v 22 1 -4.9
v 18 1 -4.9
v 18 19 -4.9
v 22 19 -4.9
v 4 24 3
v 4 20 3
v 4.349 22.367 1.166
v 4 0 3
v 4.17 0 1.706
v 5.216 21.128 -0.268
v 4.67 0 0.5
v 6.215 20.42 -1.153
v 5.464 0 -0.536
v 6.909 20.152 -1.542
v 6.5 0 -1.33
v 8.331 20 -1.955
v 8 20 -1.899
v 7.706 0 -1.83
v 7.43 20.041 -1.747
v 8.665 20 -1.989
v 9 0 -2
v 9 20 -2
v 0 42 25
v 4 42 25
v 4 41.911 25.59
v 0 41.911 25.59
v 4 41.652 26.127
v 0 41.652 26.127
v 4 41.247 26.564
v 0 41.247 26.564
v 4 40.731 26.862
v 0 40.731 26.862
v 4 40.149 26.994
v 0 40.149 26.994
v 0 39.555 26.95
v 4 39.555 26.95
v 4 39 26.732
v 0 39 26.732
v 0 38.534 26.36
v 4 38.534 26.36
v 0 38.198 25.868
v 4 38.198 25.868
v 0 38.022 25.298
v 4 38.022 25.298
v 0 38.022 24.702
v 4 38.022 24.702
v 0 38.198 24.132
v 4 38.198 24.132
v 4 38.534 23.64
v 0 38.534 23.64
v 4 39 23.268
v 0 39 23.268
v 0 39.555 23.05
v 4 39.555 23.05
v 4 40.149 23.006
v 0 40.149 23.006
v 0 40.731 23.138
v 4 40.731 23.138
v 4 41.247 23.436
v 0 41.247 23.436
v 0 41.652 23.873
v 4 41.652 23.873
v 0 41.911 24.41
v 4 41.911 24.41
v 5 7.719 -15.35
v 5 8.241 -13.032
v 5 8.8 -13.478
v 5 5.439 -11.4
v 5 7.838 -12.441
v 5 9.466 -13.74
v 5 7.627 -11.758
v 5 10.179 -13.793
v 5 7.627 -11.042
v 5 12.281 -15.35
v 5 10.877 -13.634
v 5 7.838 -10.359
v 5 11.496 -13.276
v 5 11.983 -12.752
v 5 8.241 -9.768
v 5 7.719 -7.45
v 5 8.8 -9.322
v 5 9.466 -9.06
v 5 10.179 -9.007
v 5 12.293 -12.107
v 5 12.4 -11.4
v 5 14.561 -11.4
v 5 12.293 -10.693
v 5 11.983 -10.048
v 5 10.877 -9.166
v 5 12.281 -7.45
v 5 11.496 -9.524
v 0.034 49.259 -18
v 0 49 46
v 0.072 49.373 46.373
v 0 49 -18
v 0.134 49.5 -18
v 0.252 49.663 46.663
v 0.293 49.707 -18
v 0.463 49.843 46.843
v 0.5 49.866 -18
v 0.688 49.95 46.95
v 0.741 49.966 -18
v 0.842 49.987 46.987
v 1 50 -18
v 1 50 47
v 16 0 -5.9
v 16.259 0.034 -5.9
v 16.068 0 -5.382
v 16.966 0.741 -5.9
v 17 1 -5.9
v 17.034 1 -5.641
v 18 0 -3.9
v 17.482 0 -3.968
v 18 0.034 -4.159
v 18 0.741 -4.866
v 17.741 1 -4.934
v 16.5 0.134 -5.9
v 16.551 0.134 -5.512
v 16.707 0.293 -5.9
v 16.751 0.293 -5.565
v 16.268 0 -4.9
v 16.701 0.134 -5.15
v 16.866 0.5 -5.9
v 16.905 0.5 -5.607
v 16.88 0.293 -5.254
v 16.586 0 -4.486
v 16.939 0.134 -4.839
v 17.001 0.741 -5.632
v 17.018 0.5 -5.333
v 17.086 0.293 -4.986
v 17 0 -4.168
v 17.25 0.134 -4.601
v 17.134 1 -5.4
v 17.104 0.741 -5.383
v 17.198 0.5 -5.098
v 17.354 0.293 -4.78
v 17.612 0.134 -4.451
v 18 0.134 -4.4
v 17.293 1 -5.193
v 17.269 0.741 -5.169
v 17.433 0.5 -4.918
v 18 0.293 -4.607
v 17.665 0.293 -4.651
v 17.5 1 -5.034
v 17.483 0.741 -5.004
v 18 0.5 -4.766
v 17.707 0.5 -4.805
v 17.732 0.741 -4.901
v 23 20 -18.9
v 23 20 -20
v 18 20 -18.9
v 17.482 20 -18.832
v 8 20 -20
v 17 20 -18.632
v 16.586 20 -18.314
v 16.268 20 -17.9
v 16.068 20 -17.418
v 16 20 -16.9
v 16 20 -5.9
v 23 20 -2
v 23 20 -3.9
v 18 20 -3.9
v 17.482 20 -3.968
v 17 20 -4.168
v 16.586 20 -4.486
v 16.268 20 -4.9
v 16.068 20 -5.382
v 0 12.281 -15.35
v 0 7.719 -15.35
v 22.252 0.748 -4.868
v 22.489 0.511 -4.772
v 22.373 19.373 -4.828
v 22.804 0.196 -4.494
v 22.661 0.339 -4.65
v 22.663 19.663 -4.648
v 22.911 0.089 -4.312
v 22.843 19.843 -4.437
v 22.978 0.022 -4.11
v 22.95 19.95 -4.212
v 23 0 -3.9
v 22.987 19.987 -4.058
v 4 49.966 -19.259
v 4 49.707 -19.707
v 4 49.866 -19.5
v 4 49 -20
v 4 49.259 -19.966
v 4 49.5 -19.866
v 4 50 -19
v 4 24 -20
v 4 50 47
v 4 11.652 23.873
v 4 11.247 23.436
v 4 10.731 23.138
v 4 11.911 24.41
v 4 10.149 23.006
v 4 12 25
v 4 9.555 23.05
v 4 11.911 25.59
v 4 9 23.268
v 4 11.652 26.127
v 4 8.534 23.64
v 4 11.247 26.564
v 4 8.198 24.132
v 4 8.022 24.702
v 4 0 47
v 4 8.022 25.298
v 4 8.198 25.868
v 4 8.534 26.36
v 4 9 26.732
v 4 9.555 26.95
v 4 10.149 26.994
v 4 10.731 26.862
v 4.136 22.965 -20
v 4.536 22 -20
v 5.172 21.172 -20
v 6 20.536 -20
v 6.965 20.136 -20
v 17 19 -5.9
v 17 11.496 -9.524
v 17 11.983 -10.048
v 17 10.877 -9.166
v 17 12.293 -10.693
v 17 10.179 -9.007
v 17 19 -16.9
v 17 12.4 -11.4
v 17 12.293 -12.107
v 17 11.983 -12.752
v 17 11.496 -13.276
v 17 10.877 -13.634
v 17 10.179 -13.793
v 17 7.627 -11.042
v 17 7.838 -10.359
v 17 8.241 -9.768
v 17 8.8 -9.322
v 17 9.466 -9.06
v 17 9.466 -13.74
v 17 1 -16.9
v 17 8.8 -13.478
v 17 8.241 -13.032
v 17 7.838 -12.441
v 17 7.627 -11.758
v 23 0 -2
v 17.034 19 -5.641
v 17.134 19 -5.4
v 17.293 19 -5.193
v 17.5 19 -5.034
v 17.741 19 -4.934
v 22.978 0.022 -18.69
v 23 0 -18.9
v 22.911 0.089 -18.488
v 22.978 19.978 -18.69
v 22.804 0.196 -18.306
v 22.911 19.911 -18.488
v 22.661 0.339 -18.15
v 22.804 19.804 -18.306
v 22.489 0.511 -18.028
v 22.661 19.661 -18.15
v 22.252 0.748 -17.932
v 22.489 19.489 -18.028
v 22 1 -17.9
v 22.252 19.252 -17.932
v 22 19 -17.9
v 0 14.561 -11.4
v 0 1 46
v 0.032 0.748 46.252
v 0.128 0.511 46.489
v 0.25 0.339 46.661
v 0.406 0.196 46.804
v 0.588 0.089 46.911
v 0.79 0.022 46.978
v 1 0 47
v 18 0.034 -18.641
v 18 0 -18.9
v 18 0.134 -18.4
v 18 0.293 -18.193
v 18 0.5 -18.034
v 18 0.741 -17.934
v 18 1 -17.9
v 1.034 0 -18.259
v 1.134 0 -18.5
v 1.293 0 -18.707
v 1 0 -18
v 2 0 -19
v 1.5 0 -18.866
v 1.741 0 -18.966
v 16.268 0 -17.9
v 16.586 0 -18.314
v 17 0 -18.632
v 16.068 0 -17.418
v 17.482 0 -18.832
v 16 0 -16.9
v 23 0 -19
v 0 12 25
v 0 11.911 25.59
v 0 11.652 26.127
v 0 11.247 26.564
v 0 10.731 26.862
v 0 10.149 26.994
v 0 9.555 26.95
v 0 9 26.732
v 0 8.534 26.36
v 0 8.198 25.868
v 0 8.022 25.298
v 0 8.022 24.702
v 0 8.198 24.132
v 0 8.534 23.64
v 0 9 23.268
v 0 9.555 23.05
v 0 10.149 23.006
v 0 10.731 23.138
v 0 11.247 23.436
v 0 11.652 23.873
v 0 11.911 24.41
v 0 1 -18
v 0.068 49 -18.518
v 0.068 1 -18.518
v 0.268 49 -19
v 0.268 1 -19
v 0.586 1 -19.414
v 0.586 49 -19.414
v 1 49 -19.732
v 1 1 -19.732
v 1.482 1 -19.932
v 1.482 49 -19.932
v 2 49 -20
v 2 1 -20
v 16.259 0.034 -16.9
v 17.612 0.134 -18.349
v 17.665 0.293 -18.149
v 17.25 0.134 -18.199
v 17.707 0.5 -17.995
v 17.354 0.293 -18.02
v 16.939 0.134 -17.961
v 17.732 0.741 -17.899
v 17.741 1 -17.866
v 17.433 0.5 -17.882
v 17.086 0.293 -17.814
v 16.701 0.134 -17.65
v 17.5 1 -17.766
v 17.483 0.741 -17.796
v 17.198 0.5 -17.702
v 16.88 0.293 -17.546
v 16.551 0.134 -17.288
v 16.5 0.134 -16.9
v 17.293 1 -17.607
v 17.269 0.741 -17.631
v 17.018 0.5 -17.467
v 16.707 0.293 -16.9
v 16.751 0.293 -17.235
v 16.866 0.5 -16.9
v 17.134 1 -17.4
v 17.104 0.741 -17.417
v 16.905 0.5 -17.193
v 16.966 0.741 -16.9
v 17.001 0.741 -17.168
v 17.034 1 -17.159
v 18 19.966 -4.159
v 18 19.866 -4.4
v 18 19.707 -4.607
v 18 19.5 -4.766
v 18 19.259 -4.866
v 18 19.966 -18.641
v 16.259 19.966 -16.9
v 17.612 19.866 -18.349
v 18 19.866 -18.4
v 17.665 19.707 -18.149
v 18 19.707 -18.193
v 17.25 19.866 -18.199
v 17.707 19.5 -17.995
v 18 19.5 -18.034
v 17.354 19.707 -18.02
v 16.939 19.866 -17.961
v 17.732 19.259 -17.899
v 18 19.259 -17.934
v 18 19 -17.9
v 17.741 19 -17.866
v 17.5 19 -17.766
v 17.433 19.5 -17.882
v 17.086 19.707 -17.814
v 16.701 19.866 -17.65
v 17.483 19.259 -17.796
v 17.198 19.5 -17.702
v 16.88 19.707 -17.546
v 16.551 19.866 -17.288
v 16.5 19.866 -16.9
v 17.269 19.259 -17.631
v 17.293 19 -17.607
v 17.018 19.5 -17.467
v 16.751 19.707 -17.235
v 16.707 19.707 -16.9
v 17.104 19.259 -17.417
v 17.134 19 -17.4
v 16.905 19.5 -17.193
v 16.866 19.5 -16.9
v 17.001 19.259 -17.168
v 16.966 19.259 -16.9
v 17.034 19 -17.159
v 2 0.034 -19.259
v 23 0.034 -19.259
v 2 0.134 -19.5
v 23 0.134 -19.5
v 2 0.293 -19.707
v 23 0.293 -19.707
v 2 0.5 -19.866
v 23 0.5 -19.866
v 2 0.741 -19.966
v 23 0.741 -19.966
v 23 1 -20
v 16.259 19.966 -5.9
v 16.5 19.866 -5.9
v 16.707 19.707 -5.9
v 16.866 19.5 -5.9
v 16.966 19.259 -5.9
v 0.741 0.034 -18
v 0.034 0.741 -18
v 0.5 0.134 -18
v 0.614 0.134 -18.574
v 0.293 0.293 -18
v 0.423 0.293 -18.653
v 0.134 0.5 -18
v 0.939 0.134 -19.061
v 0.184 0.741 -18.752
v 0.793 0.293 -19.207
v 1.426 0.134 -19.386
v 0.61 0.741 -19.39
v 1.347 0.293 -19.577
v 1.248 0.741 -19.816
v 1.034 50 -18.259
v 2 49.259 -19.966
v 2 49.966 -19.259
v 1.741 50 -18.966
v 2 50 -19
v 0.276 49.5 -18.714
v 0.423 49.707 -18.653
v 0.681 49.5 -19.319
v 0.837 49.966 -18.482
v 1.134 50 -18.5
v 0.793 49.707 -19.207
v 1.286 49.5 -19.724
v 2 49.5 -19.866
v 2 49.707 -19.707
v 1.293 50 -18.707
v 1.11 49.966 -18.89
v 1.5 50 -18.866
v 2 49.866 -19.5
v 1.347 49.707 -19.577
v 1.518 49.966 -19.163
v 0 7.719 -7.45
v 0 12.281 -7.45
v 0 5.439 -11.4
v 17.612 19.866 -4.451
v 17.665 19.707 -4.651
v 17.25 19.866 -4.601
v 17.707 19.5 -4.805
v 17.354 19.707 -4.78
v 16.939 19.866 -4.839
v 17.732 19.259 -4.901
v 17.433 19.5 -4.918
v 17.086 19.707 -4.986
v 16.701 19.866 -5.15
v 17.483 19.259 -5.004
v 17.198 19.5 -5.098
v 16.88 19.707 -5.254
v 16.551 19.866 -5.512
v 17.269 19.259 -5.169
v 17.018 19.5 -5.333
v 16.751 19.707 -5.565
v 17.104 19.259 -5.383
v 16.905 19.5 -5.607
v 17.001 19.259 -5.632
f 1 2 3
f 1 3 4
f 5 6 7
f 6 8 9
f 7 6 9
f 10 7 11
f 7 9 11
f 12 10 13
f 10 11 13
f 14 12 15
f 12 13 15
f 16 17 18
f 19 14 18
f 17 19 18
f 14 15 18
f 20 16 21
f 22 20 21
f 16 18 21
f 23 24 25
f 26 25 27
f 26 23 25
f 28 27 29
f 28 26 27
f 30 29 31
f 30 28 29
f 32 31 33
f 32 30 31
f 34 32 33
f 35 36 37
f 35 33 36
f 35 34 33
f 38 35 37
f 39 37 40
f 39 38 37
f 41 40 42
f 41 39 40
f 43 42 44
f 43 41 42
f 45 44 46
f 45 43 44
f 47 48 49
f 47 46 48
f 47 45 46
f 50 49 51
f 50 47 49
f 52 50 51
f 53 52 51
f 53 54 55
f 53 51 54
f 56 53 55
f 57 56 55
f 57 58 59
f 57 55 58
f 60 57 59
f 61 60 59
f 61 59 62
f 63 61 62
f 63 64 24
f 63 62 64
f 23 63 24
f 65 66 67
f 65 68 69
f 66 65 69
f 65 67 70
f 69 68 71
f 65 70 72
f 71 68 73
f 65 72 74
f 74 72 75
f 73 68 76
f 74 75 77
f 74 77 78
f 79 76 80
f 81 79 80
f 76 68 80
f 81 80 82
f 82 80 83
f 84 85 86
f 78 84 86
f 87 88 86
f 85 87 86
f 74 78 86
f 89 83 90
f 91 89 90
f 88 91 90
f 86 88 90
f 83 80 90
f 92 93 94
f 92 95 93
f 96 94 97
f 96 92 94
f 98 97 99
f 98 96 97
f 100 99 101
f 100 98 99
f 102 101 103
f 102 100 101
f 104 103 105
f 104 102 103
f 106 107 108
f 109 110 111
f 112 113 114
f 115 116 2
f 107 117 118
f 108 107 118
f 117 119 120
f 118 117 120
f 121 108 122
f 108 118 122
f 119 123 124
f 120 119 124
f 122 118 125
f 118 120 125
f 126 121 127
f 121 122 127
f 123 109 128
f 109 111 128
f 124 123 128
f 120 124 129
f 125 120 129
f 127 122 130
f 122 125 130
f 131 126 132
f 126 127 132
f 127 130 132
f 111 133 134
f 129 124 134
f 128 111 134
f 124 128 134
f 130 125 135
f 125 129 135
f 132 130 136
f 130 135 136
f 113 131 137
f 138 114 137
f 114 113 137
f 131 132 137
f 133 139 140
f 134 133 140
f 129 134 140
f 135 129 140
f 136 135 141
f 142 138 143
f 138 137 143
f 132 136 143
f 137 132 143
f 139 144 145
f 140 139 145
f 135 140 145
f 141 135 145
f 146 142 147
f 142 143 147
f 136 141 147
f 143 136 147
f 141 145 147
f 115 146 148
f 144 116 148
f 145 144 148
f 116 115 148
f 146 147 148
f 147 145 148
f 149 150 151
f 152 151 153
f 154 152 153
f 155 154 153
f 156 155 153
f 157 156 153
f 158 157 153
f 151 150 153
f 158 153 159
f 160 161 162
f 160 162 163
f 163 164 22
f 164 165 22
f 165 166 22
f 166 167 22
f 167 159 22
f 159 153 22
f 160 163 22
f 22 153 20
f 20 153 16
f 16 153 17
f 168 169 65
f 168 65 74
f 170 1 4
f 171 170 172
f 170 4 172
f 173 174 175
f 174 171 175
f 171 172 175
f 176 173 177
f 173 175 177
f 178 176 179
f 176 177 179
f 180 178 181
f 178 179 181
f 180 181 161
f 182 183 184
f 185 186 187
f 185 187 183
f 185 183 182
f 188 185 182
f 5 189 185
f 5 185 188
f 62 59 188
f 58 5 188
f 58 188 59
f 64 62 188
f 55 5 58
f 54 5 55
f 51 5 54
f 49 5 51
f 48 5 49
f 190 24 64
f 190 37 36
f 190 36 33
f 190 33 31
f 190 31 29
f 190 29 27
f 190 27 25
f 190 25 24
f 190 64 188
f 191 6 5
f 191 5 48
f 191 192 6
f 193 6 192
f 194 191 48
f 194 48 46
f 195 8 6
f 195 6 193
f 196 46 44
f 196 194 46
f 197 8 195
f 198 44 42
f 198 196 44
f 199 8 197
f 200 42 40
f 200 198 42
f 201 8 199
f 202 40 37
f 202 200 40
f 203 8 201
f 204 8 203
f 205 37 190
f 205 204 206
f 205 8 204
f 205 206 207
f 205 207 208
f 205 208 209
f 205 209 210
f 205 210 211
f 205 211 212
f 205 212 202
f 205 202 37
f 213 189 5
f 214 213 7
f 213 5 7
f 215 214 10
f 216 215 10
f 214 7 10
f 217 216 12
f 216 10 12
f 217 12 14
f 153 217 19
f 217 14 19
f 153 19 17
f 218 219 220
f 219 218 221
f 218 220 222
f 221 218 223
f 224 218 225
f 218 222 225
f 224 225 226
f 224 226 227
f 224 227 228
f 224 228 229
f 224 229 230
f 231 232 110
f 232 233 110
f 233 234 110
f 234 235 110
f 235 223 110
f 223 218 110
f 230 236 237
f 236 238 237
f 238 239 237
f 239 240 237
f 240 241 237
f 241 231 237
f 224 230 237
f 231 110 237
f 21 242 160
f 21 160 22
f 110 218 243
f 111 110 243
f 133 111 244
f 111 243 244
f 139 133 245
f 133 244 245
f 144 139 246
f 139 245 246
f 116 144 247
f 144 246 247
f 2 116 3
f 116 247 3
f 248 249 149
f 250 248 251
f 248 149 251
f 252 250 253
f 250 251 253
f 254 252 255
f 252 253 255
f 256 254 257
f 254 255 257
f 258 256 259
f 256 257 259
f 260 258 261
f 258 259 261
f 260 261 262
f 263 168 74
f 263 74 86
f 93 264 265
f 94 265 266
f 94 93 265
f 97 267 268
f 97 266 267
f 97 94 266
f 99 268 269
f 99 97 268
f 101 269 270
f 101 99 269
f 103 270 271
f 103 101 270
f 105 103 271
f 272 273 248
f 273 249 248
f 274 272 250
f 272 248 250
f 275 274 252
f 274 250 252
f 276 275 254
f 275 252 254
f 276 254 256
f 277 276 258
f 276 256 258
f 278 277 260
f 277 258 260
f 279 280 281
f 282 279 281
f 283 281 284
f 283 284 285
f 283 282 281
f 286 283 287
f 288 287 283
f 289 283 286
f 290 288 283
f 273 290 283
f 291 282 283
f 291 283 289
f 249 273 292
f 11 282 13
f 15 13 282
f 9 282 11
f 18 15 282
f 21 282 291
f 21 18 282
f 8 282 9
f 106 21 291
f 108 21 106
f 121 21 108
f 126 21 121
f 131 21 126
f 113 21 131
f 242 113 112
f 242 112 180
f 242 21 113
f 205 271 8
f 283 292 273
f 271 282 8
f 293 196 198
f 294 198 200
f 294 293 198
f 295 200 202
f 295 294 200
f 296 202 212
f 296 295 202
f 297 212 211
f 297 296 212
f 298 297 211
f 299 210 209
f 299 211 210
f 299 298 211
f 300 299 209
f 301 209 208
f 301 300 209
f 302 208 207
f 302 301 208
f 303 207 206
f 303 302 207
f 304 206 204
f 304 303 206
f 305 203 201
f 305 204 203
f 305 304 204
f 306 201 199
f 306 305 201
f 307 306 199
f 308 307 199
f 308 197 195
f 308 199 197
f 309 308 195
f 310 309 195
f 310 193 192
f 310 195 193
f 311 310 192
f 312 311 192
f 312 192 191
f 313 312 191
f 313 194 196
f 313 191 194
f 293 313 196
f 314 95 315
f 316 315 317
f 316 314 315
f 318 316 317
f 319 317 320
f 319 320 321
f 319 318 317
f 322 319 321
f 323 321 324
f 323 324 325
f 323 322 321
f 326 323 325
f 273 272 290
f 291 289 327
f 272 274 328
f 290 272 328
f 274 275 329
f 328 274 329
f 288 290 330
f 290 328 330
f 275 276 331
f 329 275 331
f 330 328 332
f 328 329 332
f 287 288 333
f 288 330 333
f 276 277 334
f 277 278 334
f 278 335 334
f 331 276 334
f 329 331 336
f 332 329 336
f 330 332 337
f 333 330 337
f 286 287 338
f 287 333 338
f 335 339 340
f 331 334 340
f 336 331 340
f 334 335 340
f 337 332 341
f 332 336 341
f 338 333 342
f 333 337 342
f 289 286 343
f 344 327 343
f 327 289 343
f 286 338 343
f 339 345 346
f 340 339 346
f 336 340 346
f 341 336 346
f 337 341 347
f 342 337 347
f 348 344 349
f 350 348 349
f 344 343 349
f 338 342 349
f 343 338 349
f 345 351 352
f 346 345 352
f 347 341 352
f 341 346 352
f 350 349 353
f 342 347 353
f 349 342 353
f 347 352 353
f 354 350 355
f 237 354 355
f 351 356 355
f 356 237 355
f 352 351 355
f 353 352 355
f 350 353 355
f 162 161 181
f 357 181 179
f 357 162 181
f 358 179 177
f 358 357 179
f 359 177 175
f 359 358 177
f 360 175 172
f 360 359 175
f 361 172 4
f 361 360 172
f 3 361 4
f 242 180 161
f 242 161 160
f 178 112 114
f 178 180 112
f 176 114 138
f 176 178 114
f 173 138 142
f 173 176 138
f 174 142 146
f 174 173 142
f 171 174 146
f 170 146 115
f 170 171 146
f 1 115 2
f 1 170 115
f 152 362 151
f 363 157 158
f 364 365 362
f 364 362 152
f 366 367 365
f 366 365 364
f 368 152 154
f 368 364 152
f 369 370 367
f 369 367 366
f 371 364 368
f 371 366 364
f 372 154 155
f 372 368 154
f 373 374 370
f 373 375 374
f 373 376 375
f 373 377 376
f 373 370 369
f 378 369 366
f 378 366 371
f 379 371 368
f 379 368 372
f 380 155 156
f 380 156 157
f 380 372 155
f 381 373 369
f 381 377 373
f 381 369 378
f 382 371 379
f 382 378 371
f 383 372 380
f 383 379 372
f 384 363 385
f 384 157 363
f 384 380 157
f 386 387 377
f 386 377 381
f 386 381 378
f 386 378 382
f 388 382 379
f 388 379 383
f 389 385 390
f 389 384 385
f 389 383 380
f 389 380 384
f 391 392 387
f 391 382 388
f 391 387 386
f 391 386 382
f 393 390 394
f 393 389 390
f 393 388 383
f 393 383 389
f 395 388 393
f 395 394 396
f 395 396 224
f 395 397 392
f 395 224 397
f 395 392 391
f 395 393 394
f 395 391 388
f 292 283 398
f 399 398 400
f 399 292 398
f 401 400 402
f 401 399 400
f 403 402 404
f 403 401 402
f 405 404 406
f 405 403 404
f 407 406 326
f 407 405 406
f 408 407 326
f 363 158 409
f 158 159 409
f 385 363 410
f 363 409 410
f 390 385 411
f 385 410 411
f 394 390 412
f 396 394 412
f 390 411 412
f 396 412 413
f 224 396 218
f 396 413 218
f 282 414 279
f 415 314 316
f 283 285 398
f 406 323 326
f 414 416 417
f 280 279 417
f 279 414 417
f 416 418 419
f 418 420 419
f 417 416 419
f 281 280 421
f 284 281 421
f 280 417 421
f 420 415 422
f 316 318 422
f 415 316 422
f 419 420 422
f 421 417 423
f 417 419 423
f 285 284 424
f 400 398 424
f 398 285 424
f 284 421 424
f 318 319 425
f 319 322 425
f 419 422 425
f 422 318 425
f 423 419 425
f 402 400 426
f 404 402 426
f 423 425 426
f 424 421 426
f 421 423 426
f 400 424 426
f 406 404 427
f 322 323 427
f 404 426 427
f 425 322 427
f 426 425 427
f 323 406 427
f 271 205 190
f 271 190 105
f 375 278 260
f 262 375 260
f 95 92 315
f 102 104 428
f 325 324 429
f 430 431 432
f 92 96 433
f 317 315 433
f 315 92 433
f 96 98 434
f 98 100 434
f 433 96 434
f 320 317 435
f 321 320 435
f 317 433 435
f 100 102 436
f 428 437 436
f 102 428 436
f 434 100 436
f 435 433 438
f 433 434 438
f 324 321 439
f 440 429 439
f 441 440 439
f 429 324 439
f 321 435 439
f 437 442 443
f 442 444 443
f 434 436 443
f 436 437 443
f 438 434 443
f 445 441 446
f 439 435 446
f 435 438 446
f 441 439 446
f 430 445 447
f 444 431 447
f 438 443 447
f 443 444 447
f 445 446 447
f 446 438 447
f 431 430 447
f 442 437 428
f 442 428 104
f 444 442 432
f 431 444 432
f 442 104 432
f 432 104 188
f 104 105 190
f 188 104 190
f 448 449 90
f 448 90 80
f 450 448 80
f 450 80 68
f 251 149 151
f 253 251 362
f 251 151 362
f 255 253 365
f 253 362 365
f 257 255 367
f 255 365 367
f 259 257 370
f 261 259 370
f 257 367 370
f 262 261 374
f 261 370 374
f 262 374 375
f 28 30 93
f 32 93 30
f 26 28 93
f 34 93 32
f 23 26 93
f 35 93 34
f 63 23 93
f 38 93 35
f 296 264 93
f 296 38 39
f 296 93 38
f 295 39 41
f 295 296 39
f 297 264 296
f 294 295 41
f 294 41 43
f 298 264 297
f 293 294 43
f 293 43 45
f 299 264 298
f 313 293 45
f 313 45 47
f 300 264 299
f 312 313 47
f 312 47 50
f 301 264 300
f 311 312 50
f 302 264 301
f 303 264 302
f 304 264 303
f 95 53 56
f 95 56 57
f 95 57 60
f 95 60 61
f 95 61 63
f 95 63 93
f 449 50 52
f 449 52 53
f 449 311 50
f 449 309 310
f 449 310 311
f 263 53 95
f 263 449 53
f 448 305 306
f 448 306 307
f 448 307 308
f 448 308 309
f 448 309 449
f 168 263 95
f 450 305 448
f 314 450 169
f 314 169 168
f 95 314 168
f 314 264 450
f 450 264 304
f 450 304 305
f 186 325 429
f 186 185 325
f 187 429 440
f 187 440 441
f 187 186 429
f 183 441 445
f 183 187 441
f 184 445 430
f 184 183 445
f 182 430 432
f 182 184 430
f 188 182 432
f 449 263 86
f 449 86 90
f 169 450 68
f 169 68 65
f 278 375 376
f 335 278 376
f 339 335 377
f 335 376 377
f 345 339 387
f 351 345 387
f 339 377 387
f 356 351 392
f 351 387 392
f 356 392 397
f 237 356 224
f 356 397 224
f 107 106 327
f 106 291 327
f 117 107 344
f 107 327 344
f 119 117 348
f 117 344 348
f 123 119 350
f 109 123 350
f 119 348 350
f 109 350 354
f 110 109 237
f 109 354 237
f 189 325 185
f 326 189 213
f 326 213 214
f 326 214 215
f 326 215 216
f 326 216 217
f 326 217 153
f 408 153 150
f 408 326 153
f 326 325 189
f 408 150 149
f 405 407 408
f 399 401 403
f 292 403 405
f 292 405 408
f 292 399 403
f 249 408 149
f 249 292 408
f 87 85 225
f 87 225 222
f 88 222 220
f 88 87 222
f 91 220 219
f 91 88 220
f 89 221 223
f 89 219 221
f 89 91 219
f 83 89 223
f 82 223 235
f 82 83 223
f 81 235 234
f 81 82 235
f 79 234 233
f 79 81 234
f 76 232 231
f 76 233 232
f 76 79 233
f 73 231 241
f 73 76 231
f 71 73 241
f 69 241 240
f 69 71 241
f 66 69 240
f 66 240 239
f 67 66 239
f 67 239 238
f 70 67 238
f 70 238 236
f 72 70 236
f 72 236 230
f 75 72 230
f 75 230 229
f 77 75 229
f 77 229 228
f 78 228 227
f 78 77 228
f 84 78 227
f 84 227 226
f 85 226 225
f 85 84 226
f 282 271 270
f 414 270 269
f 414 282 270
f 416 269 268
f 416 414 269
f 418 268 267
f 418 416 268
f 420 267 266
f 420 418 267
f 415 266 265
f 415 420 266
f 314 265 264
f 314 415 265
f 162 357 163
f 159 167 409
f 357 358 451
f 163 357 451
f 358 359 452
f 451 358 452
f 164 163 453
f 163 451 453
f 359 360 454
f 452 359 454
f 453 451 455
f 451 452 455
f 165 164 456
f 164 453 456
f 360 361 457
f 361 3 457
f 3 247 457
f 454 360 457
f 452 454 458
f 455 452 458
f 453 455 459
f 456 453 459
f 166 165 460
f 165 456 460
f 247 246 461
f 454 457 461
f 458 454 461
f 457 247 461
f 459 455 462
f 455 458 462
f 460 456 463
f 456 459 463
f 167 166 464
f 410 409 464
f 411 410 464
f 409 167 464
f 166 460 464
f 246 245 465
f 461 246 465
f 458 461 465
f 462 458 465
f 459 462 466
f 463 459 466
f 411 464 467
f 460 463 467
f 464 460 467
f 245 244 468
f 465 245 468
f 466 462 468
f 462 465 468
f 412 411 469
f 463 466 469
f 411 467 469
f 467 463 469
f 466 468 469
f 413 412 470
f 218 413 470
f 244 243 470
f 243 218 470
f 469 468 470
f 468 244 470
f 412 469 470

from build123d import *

# Parameters (mm, degrees)
PAD008_DEPTH    = 50
SKETCH046_R     = 2.4
SKETCH046_R_2   = 2
POCKET024_DEPTH = 30
SKETCH047_W     = 30
SKETCH047_H     = 35
POCKET025_DEPTH = 30
POCKET026_DEPTH = 5
FILLET014_R     = 4
FILLET015_R     = 1
FILLET016_R     = 1


with BuildPart() as part:
    # Sketch045 → Pad008 (new body)
    with BuildSketch(Plane.XZ):
        with BuildLine():
            Line((0, 47), (0, -18))
            ThreePointArc((0, -18), (0.585786, -19.414214), (2, -20))
            Line((2, -20), (23, -20))
            Line((23, -20), (23, -17.9))
            Line((17, -17.9), (23, -17.9))
            Line((17, -4.9), (17, -17.9))
            Line((17, -4.9), (23, -4.9))
            Line((23, -4.9), (23, -2))
            Line((23, -2), (9, -2))
            ThreePointArc((4, 3), (5.464466, -0.535534), (9, -2))
            Line((4, 3), (4, 47))
            Line((4, 47), (0, 47))
        make_face()
    extrude(amount=-PAD008_DEPTH)

    # Sketch046 → Pocket024 (cut)
    with BuildSketch(Plane.YZ):
        with Locations((10, -11.4)):
            Circle(SKETCH046_R)
        with Locations((10, 25)):
            Circle(SKETCH046_R_2)
        with Locations((40, 25)):
            Circle(SKETCH046_R_2)
    extrude(amount=POCKET024_DEPTH, mode=Mode.SUBTRACT)

    # Sketch047 → Pocket025 (cut)
    with BuildSketch(Plane.YZ.offset(4)):
        with Locations((35, -2.5)):
            Rectangle(SKETCH047_W, SKETCH047_H)
    extrude(amount=POCKET025_DEPTH, mode=Mode.SUBTRACT)

    # Sketch048 → Pocket026 (cut)
    with BuildSketch(Plane.YZ):
        Polygon((5.438933, -11.4), (7.719466, -15.35), (12.280534, -15.35), (14.561067, -11.4), (12.280534, -7.45), (7.719466, -7.45), align=None)
    extrude(amount=POCKET026_DEPTH, mode=Mode.SUBTRACT)

    # Fillet014
    fillet014_edges = [part.edges().sort_by_distance(p)[0] for p in [
        (4, 20, -8.5),
    ]]
    fillet(fillet014_edges, radius=FILLET014_R)

    # Fillet015
    fillet015_edges = [part.edges().sort_by_distance(p)[0] for p in [
        (20, 0, -4.9),
        (23, 10, -4.9),
        (17, 10, -4.9),
        (20, 20, -4.9),
        (17, 20, -11.4),
        (17, 0, -11.4),
        (23, 10, -17.9),
        (17, 10, -17.9),
        (20, 20, -17.9),
        (20, 0, -17.9),
    ]]
    fillet(fillet015_edges, radius=FILLET015_R)

    # Fillet016
    fillet016_edges = [part.edges().sort_by_distance(p)[0] for p in [
        (0, 0, 14.5),
        (0, 25, 47),
        (0, 50, 14.5),
    ]]
    fillet(fillet016_edges, radius=FILLET016_R)


solid = part.part
